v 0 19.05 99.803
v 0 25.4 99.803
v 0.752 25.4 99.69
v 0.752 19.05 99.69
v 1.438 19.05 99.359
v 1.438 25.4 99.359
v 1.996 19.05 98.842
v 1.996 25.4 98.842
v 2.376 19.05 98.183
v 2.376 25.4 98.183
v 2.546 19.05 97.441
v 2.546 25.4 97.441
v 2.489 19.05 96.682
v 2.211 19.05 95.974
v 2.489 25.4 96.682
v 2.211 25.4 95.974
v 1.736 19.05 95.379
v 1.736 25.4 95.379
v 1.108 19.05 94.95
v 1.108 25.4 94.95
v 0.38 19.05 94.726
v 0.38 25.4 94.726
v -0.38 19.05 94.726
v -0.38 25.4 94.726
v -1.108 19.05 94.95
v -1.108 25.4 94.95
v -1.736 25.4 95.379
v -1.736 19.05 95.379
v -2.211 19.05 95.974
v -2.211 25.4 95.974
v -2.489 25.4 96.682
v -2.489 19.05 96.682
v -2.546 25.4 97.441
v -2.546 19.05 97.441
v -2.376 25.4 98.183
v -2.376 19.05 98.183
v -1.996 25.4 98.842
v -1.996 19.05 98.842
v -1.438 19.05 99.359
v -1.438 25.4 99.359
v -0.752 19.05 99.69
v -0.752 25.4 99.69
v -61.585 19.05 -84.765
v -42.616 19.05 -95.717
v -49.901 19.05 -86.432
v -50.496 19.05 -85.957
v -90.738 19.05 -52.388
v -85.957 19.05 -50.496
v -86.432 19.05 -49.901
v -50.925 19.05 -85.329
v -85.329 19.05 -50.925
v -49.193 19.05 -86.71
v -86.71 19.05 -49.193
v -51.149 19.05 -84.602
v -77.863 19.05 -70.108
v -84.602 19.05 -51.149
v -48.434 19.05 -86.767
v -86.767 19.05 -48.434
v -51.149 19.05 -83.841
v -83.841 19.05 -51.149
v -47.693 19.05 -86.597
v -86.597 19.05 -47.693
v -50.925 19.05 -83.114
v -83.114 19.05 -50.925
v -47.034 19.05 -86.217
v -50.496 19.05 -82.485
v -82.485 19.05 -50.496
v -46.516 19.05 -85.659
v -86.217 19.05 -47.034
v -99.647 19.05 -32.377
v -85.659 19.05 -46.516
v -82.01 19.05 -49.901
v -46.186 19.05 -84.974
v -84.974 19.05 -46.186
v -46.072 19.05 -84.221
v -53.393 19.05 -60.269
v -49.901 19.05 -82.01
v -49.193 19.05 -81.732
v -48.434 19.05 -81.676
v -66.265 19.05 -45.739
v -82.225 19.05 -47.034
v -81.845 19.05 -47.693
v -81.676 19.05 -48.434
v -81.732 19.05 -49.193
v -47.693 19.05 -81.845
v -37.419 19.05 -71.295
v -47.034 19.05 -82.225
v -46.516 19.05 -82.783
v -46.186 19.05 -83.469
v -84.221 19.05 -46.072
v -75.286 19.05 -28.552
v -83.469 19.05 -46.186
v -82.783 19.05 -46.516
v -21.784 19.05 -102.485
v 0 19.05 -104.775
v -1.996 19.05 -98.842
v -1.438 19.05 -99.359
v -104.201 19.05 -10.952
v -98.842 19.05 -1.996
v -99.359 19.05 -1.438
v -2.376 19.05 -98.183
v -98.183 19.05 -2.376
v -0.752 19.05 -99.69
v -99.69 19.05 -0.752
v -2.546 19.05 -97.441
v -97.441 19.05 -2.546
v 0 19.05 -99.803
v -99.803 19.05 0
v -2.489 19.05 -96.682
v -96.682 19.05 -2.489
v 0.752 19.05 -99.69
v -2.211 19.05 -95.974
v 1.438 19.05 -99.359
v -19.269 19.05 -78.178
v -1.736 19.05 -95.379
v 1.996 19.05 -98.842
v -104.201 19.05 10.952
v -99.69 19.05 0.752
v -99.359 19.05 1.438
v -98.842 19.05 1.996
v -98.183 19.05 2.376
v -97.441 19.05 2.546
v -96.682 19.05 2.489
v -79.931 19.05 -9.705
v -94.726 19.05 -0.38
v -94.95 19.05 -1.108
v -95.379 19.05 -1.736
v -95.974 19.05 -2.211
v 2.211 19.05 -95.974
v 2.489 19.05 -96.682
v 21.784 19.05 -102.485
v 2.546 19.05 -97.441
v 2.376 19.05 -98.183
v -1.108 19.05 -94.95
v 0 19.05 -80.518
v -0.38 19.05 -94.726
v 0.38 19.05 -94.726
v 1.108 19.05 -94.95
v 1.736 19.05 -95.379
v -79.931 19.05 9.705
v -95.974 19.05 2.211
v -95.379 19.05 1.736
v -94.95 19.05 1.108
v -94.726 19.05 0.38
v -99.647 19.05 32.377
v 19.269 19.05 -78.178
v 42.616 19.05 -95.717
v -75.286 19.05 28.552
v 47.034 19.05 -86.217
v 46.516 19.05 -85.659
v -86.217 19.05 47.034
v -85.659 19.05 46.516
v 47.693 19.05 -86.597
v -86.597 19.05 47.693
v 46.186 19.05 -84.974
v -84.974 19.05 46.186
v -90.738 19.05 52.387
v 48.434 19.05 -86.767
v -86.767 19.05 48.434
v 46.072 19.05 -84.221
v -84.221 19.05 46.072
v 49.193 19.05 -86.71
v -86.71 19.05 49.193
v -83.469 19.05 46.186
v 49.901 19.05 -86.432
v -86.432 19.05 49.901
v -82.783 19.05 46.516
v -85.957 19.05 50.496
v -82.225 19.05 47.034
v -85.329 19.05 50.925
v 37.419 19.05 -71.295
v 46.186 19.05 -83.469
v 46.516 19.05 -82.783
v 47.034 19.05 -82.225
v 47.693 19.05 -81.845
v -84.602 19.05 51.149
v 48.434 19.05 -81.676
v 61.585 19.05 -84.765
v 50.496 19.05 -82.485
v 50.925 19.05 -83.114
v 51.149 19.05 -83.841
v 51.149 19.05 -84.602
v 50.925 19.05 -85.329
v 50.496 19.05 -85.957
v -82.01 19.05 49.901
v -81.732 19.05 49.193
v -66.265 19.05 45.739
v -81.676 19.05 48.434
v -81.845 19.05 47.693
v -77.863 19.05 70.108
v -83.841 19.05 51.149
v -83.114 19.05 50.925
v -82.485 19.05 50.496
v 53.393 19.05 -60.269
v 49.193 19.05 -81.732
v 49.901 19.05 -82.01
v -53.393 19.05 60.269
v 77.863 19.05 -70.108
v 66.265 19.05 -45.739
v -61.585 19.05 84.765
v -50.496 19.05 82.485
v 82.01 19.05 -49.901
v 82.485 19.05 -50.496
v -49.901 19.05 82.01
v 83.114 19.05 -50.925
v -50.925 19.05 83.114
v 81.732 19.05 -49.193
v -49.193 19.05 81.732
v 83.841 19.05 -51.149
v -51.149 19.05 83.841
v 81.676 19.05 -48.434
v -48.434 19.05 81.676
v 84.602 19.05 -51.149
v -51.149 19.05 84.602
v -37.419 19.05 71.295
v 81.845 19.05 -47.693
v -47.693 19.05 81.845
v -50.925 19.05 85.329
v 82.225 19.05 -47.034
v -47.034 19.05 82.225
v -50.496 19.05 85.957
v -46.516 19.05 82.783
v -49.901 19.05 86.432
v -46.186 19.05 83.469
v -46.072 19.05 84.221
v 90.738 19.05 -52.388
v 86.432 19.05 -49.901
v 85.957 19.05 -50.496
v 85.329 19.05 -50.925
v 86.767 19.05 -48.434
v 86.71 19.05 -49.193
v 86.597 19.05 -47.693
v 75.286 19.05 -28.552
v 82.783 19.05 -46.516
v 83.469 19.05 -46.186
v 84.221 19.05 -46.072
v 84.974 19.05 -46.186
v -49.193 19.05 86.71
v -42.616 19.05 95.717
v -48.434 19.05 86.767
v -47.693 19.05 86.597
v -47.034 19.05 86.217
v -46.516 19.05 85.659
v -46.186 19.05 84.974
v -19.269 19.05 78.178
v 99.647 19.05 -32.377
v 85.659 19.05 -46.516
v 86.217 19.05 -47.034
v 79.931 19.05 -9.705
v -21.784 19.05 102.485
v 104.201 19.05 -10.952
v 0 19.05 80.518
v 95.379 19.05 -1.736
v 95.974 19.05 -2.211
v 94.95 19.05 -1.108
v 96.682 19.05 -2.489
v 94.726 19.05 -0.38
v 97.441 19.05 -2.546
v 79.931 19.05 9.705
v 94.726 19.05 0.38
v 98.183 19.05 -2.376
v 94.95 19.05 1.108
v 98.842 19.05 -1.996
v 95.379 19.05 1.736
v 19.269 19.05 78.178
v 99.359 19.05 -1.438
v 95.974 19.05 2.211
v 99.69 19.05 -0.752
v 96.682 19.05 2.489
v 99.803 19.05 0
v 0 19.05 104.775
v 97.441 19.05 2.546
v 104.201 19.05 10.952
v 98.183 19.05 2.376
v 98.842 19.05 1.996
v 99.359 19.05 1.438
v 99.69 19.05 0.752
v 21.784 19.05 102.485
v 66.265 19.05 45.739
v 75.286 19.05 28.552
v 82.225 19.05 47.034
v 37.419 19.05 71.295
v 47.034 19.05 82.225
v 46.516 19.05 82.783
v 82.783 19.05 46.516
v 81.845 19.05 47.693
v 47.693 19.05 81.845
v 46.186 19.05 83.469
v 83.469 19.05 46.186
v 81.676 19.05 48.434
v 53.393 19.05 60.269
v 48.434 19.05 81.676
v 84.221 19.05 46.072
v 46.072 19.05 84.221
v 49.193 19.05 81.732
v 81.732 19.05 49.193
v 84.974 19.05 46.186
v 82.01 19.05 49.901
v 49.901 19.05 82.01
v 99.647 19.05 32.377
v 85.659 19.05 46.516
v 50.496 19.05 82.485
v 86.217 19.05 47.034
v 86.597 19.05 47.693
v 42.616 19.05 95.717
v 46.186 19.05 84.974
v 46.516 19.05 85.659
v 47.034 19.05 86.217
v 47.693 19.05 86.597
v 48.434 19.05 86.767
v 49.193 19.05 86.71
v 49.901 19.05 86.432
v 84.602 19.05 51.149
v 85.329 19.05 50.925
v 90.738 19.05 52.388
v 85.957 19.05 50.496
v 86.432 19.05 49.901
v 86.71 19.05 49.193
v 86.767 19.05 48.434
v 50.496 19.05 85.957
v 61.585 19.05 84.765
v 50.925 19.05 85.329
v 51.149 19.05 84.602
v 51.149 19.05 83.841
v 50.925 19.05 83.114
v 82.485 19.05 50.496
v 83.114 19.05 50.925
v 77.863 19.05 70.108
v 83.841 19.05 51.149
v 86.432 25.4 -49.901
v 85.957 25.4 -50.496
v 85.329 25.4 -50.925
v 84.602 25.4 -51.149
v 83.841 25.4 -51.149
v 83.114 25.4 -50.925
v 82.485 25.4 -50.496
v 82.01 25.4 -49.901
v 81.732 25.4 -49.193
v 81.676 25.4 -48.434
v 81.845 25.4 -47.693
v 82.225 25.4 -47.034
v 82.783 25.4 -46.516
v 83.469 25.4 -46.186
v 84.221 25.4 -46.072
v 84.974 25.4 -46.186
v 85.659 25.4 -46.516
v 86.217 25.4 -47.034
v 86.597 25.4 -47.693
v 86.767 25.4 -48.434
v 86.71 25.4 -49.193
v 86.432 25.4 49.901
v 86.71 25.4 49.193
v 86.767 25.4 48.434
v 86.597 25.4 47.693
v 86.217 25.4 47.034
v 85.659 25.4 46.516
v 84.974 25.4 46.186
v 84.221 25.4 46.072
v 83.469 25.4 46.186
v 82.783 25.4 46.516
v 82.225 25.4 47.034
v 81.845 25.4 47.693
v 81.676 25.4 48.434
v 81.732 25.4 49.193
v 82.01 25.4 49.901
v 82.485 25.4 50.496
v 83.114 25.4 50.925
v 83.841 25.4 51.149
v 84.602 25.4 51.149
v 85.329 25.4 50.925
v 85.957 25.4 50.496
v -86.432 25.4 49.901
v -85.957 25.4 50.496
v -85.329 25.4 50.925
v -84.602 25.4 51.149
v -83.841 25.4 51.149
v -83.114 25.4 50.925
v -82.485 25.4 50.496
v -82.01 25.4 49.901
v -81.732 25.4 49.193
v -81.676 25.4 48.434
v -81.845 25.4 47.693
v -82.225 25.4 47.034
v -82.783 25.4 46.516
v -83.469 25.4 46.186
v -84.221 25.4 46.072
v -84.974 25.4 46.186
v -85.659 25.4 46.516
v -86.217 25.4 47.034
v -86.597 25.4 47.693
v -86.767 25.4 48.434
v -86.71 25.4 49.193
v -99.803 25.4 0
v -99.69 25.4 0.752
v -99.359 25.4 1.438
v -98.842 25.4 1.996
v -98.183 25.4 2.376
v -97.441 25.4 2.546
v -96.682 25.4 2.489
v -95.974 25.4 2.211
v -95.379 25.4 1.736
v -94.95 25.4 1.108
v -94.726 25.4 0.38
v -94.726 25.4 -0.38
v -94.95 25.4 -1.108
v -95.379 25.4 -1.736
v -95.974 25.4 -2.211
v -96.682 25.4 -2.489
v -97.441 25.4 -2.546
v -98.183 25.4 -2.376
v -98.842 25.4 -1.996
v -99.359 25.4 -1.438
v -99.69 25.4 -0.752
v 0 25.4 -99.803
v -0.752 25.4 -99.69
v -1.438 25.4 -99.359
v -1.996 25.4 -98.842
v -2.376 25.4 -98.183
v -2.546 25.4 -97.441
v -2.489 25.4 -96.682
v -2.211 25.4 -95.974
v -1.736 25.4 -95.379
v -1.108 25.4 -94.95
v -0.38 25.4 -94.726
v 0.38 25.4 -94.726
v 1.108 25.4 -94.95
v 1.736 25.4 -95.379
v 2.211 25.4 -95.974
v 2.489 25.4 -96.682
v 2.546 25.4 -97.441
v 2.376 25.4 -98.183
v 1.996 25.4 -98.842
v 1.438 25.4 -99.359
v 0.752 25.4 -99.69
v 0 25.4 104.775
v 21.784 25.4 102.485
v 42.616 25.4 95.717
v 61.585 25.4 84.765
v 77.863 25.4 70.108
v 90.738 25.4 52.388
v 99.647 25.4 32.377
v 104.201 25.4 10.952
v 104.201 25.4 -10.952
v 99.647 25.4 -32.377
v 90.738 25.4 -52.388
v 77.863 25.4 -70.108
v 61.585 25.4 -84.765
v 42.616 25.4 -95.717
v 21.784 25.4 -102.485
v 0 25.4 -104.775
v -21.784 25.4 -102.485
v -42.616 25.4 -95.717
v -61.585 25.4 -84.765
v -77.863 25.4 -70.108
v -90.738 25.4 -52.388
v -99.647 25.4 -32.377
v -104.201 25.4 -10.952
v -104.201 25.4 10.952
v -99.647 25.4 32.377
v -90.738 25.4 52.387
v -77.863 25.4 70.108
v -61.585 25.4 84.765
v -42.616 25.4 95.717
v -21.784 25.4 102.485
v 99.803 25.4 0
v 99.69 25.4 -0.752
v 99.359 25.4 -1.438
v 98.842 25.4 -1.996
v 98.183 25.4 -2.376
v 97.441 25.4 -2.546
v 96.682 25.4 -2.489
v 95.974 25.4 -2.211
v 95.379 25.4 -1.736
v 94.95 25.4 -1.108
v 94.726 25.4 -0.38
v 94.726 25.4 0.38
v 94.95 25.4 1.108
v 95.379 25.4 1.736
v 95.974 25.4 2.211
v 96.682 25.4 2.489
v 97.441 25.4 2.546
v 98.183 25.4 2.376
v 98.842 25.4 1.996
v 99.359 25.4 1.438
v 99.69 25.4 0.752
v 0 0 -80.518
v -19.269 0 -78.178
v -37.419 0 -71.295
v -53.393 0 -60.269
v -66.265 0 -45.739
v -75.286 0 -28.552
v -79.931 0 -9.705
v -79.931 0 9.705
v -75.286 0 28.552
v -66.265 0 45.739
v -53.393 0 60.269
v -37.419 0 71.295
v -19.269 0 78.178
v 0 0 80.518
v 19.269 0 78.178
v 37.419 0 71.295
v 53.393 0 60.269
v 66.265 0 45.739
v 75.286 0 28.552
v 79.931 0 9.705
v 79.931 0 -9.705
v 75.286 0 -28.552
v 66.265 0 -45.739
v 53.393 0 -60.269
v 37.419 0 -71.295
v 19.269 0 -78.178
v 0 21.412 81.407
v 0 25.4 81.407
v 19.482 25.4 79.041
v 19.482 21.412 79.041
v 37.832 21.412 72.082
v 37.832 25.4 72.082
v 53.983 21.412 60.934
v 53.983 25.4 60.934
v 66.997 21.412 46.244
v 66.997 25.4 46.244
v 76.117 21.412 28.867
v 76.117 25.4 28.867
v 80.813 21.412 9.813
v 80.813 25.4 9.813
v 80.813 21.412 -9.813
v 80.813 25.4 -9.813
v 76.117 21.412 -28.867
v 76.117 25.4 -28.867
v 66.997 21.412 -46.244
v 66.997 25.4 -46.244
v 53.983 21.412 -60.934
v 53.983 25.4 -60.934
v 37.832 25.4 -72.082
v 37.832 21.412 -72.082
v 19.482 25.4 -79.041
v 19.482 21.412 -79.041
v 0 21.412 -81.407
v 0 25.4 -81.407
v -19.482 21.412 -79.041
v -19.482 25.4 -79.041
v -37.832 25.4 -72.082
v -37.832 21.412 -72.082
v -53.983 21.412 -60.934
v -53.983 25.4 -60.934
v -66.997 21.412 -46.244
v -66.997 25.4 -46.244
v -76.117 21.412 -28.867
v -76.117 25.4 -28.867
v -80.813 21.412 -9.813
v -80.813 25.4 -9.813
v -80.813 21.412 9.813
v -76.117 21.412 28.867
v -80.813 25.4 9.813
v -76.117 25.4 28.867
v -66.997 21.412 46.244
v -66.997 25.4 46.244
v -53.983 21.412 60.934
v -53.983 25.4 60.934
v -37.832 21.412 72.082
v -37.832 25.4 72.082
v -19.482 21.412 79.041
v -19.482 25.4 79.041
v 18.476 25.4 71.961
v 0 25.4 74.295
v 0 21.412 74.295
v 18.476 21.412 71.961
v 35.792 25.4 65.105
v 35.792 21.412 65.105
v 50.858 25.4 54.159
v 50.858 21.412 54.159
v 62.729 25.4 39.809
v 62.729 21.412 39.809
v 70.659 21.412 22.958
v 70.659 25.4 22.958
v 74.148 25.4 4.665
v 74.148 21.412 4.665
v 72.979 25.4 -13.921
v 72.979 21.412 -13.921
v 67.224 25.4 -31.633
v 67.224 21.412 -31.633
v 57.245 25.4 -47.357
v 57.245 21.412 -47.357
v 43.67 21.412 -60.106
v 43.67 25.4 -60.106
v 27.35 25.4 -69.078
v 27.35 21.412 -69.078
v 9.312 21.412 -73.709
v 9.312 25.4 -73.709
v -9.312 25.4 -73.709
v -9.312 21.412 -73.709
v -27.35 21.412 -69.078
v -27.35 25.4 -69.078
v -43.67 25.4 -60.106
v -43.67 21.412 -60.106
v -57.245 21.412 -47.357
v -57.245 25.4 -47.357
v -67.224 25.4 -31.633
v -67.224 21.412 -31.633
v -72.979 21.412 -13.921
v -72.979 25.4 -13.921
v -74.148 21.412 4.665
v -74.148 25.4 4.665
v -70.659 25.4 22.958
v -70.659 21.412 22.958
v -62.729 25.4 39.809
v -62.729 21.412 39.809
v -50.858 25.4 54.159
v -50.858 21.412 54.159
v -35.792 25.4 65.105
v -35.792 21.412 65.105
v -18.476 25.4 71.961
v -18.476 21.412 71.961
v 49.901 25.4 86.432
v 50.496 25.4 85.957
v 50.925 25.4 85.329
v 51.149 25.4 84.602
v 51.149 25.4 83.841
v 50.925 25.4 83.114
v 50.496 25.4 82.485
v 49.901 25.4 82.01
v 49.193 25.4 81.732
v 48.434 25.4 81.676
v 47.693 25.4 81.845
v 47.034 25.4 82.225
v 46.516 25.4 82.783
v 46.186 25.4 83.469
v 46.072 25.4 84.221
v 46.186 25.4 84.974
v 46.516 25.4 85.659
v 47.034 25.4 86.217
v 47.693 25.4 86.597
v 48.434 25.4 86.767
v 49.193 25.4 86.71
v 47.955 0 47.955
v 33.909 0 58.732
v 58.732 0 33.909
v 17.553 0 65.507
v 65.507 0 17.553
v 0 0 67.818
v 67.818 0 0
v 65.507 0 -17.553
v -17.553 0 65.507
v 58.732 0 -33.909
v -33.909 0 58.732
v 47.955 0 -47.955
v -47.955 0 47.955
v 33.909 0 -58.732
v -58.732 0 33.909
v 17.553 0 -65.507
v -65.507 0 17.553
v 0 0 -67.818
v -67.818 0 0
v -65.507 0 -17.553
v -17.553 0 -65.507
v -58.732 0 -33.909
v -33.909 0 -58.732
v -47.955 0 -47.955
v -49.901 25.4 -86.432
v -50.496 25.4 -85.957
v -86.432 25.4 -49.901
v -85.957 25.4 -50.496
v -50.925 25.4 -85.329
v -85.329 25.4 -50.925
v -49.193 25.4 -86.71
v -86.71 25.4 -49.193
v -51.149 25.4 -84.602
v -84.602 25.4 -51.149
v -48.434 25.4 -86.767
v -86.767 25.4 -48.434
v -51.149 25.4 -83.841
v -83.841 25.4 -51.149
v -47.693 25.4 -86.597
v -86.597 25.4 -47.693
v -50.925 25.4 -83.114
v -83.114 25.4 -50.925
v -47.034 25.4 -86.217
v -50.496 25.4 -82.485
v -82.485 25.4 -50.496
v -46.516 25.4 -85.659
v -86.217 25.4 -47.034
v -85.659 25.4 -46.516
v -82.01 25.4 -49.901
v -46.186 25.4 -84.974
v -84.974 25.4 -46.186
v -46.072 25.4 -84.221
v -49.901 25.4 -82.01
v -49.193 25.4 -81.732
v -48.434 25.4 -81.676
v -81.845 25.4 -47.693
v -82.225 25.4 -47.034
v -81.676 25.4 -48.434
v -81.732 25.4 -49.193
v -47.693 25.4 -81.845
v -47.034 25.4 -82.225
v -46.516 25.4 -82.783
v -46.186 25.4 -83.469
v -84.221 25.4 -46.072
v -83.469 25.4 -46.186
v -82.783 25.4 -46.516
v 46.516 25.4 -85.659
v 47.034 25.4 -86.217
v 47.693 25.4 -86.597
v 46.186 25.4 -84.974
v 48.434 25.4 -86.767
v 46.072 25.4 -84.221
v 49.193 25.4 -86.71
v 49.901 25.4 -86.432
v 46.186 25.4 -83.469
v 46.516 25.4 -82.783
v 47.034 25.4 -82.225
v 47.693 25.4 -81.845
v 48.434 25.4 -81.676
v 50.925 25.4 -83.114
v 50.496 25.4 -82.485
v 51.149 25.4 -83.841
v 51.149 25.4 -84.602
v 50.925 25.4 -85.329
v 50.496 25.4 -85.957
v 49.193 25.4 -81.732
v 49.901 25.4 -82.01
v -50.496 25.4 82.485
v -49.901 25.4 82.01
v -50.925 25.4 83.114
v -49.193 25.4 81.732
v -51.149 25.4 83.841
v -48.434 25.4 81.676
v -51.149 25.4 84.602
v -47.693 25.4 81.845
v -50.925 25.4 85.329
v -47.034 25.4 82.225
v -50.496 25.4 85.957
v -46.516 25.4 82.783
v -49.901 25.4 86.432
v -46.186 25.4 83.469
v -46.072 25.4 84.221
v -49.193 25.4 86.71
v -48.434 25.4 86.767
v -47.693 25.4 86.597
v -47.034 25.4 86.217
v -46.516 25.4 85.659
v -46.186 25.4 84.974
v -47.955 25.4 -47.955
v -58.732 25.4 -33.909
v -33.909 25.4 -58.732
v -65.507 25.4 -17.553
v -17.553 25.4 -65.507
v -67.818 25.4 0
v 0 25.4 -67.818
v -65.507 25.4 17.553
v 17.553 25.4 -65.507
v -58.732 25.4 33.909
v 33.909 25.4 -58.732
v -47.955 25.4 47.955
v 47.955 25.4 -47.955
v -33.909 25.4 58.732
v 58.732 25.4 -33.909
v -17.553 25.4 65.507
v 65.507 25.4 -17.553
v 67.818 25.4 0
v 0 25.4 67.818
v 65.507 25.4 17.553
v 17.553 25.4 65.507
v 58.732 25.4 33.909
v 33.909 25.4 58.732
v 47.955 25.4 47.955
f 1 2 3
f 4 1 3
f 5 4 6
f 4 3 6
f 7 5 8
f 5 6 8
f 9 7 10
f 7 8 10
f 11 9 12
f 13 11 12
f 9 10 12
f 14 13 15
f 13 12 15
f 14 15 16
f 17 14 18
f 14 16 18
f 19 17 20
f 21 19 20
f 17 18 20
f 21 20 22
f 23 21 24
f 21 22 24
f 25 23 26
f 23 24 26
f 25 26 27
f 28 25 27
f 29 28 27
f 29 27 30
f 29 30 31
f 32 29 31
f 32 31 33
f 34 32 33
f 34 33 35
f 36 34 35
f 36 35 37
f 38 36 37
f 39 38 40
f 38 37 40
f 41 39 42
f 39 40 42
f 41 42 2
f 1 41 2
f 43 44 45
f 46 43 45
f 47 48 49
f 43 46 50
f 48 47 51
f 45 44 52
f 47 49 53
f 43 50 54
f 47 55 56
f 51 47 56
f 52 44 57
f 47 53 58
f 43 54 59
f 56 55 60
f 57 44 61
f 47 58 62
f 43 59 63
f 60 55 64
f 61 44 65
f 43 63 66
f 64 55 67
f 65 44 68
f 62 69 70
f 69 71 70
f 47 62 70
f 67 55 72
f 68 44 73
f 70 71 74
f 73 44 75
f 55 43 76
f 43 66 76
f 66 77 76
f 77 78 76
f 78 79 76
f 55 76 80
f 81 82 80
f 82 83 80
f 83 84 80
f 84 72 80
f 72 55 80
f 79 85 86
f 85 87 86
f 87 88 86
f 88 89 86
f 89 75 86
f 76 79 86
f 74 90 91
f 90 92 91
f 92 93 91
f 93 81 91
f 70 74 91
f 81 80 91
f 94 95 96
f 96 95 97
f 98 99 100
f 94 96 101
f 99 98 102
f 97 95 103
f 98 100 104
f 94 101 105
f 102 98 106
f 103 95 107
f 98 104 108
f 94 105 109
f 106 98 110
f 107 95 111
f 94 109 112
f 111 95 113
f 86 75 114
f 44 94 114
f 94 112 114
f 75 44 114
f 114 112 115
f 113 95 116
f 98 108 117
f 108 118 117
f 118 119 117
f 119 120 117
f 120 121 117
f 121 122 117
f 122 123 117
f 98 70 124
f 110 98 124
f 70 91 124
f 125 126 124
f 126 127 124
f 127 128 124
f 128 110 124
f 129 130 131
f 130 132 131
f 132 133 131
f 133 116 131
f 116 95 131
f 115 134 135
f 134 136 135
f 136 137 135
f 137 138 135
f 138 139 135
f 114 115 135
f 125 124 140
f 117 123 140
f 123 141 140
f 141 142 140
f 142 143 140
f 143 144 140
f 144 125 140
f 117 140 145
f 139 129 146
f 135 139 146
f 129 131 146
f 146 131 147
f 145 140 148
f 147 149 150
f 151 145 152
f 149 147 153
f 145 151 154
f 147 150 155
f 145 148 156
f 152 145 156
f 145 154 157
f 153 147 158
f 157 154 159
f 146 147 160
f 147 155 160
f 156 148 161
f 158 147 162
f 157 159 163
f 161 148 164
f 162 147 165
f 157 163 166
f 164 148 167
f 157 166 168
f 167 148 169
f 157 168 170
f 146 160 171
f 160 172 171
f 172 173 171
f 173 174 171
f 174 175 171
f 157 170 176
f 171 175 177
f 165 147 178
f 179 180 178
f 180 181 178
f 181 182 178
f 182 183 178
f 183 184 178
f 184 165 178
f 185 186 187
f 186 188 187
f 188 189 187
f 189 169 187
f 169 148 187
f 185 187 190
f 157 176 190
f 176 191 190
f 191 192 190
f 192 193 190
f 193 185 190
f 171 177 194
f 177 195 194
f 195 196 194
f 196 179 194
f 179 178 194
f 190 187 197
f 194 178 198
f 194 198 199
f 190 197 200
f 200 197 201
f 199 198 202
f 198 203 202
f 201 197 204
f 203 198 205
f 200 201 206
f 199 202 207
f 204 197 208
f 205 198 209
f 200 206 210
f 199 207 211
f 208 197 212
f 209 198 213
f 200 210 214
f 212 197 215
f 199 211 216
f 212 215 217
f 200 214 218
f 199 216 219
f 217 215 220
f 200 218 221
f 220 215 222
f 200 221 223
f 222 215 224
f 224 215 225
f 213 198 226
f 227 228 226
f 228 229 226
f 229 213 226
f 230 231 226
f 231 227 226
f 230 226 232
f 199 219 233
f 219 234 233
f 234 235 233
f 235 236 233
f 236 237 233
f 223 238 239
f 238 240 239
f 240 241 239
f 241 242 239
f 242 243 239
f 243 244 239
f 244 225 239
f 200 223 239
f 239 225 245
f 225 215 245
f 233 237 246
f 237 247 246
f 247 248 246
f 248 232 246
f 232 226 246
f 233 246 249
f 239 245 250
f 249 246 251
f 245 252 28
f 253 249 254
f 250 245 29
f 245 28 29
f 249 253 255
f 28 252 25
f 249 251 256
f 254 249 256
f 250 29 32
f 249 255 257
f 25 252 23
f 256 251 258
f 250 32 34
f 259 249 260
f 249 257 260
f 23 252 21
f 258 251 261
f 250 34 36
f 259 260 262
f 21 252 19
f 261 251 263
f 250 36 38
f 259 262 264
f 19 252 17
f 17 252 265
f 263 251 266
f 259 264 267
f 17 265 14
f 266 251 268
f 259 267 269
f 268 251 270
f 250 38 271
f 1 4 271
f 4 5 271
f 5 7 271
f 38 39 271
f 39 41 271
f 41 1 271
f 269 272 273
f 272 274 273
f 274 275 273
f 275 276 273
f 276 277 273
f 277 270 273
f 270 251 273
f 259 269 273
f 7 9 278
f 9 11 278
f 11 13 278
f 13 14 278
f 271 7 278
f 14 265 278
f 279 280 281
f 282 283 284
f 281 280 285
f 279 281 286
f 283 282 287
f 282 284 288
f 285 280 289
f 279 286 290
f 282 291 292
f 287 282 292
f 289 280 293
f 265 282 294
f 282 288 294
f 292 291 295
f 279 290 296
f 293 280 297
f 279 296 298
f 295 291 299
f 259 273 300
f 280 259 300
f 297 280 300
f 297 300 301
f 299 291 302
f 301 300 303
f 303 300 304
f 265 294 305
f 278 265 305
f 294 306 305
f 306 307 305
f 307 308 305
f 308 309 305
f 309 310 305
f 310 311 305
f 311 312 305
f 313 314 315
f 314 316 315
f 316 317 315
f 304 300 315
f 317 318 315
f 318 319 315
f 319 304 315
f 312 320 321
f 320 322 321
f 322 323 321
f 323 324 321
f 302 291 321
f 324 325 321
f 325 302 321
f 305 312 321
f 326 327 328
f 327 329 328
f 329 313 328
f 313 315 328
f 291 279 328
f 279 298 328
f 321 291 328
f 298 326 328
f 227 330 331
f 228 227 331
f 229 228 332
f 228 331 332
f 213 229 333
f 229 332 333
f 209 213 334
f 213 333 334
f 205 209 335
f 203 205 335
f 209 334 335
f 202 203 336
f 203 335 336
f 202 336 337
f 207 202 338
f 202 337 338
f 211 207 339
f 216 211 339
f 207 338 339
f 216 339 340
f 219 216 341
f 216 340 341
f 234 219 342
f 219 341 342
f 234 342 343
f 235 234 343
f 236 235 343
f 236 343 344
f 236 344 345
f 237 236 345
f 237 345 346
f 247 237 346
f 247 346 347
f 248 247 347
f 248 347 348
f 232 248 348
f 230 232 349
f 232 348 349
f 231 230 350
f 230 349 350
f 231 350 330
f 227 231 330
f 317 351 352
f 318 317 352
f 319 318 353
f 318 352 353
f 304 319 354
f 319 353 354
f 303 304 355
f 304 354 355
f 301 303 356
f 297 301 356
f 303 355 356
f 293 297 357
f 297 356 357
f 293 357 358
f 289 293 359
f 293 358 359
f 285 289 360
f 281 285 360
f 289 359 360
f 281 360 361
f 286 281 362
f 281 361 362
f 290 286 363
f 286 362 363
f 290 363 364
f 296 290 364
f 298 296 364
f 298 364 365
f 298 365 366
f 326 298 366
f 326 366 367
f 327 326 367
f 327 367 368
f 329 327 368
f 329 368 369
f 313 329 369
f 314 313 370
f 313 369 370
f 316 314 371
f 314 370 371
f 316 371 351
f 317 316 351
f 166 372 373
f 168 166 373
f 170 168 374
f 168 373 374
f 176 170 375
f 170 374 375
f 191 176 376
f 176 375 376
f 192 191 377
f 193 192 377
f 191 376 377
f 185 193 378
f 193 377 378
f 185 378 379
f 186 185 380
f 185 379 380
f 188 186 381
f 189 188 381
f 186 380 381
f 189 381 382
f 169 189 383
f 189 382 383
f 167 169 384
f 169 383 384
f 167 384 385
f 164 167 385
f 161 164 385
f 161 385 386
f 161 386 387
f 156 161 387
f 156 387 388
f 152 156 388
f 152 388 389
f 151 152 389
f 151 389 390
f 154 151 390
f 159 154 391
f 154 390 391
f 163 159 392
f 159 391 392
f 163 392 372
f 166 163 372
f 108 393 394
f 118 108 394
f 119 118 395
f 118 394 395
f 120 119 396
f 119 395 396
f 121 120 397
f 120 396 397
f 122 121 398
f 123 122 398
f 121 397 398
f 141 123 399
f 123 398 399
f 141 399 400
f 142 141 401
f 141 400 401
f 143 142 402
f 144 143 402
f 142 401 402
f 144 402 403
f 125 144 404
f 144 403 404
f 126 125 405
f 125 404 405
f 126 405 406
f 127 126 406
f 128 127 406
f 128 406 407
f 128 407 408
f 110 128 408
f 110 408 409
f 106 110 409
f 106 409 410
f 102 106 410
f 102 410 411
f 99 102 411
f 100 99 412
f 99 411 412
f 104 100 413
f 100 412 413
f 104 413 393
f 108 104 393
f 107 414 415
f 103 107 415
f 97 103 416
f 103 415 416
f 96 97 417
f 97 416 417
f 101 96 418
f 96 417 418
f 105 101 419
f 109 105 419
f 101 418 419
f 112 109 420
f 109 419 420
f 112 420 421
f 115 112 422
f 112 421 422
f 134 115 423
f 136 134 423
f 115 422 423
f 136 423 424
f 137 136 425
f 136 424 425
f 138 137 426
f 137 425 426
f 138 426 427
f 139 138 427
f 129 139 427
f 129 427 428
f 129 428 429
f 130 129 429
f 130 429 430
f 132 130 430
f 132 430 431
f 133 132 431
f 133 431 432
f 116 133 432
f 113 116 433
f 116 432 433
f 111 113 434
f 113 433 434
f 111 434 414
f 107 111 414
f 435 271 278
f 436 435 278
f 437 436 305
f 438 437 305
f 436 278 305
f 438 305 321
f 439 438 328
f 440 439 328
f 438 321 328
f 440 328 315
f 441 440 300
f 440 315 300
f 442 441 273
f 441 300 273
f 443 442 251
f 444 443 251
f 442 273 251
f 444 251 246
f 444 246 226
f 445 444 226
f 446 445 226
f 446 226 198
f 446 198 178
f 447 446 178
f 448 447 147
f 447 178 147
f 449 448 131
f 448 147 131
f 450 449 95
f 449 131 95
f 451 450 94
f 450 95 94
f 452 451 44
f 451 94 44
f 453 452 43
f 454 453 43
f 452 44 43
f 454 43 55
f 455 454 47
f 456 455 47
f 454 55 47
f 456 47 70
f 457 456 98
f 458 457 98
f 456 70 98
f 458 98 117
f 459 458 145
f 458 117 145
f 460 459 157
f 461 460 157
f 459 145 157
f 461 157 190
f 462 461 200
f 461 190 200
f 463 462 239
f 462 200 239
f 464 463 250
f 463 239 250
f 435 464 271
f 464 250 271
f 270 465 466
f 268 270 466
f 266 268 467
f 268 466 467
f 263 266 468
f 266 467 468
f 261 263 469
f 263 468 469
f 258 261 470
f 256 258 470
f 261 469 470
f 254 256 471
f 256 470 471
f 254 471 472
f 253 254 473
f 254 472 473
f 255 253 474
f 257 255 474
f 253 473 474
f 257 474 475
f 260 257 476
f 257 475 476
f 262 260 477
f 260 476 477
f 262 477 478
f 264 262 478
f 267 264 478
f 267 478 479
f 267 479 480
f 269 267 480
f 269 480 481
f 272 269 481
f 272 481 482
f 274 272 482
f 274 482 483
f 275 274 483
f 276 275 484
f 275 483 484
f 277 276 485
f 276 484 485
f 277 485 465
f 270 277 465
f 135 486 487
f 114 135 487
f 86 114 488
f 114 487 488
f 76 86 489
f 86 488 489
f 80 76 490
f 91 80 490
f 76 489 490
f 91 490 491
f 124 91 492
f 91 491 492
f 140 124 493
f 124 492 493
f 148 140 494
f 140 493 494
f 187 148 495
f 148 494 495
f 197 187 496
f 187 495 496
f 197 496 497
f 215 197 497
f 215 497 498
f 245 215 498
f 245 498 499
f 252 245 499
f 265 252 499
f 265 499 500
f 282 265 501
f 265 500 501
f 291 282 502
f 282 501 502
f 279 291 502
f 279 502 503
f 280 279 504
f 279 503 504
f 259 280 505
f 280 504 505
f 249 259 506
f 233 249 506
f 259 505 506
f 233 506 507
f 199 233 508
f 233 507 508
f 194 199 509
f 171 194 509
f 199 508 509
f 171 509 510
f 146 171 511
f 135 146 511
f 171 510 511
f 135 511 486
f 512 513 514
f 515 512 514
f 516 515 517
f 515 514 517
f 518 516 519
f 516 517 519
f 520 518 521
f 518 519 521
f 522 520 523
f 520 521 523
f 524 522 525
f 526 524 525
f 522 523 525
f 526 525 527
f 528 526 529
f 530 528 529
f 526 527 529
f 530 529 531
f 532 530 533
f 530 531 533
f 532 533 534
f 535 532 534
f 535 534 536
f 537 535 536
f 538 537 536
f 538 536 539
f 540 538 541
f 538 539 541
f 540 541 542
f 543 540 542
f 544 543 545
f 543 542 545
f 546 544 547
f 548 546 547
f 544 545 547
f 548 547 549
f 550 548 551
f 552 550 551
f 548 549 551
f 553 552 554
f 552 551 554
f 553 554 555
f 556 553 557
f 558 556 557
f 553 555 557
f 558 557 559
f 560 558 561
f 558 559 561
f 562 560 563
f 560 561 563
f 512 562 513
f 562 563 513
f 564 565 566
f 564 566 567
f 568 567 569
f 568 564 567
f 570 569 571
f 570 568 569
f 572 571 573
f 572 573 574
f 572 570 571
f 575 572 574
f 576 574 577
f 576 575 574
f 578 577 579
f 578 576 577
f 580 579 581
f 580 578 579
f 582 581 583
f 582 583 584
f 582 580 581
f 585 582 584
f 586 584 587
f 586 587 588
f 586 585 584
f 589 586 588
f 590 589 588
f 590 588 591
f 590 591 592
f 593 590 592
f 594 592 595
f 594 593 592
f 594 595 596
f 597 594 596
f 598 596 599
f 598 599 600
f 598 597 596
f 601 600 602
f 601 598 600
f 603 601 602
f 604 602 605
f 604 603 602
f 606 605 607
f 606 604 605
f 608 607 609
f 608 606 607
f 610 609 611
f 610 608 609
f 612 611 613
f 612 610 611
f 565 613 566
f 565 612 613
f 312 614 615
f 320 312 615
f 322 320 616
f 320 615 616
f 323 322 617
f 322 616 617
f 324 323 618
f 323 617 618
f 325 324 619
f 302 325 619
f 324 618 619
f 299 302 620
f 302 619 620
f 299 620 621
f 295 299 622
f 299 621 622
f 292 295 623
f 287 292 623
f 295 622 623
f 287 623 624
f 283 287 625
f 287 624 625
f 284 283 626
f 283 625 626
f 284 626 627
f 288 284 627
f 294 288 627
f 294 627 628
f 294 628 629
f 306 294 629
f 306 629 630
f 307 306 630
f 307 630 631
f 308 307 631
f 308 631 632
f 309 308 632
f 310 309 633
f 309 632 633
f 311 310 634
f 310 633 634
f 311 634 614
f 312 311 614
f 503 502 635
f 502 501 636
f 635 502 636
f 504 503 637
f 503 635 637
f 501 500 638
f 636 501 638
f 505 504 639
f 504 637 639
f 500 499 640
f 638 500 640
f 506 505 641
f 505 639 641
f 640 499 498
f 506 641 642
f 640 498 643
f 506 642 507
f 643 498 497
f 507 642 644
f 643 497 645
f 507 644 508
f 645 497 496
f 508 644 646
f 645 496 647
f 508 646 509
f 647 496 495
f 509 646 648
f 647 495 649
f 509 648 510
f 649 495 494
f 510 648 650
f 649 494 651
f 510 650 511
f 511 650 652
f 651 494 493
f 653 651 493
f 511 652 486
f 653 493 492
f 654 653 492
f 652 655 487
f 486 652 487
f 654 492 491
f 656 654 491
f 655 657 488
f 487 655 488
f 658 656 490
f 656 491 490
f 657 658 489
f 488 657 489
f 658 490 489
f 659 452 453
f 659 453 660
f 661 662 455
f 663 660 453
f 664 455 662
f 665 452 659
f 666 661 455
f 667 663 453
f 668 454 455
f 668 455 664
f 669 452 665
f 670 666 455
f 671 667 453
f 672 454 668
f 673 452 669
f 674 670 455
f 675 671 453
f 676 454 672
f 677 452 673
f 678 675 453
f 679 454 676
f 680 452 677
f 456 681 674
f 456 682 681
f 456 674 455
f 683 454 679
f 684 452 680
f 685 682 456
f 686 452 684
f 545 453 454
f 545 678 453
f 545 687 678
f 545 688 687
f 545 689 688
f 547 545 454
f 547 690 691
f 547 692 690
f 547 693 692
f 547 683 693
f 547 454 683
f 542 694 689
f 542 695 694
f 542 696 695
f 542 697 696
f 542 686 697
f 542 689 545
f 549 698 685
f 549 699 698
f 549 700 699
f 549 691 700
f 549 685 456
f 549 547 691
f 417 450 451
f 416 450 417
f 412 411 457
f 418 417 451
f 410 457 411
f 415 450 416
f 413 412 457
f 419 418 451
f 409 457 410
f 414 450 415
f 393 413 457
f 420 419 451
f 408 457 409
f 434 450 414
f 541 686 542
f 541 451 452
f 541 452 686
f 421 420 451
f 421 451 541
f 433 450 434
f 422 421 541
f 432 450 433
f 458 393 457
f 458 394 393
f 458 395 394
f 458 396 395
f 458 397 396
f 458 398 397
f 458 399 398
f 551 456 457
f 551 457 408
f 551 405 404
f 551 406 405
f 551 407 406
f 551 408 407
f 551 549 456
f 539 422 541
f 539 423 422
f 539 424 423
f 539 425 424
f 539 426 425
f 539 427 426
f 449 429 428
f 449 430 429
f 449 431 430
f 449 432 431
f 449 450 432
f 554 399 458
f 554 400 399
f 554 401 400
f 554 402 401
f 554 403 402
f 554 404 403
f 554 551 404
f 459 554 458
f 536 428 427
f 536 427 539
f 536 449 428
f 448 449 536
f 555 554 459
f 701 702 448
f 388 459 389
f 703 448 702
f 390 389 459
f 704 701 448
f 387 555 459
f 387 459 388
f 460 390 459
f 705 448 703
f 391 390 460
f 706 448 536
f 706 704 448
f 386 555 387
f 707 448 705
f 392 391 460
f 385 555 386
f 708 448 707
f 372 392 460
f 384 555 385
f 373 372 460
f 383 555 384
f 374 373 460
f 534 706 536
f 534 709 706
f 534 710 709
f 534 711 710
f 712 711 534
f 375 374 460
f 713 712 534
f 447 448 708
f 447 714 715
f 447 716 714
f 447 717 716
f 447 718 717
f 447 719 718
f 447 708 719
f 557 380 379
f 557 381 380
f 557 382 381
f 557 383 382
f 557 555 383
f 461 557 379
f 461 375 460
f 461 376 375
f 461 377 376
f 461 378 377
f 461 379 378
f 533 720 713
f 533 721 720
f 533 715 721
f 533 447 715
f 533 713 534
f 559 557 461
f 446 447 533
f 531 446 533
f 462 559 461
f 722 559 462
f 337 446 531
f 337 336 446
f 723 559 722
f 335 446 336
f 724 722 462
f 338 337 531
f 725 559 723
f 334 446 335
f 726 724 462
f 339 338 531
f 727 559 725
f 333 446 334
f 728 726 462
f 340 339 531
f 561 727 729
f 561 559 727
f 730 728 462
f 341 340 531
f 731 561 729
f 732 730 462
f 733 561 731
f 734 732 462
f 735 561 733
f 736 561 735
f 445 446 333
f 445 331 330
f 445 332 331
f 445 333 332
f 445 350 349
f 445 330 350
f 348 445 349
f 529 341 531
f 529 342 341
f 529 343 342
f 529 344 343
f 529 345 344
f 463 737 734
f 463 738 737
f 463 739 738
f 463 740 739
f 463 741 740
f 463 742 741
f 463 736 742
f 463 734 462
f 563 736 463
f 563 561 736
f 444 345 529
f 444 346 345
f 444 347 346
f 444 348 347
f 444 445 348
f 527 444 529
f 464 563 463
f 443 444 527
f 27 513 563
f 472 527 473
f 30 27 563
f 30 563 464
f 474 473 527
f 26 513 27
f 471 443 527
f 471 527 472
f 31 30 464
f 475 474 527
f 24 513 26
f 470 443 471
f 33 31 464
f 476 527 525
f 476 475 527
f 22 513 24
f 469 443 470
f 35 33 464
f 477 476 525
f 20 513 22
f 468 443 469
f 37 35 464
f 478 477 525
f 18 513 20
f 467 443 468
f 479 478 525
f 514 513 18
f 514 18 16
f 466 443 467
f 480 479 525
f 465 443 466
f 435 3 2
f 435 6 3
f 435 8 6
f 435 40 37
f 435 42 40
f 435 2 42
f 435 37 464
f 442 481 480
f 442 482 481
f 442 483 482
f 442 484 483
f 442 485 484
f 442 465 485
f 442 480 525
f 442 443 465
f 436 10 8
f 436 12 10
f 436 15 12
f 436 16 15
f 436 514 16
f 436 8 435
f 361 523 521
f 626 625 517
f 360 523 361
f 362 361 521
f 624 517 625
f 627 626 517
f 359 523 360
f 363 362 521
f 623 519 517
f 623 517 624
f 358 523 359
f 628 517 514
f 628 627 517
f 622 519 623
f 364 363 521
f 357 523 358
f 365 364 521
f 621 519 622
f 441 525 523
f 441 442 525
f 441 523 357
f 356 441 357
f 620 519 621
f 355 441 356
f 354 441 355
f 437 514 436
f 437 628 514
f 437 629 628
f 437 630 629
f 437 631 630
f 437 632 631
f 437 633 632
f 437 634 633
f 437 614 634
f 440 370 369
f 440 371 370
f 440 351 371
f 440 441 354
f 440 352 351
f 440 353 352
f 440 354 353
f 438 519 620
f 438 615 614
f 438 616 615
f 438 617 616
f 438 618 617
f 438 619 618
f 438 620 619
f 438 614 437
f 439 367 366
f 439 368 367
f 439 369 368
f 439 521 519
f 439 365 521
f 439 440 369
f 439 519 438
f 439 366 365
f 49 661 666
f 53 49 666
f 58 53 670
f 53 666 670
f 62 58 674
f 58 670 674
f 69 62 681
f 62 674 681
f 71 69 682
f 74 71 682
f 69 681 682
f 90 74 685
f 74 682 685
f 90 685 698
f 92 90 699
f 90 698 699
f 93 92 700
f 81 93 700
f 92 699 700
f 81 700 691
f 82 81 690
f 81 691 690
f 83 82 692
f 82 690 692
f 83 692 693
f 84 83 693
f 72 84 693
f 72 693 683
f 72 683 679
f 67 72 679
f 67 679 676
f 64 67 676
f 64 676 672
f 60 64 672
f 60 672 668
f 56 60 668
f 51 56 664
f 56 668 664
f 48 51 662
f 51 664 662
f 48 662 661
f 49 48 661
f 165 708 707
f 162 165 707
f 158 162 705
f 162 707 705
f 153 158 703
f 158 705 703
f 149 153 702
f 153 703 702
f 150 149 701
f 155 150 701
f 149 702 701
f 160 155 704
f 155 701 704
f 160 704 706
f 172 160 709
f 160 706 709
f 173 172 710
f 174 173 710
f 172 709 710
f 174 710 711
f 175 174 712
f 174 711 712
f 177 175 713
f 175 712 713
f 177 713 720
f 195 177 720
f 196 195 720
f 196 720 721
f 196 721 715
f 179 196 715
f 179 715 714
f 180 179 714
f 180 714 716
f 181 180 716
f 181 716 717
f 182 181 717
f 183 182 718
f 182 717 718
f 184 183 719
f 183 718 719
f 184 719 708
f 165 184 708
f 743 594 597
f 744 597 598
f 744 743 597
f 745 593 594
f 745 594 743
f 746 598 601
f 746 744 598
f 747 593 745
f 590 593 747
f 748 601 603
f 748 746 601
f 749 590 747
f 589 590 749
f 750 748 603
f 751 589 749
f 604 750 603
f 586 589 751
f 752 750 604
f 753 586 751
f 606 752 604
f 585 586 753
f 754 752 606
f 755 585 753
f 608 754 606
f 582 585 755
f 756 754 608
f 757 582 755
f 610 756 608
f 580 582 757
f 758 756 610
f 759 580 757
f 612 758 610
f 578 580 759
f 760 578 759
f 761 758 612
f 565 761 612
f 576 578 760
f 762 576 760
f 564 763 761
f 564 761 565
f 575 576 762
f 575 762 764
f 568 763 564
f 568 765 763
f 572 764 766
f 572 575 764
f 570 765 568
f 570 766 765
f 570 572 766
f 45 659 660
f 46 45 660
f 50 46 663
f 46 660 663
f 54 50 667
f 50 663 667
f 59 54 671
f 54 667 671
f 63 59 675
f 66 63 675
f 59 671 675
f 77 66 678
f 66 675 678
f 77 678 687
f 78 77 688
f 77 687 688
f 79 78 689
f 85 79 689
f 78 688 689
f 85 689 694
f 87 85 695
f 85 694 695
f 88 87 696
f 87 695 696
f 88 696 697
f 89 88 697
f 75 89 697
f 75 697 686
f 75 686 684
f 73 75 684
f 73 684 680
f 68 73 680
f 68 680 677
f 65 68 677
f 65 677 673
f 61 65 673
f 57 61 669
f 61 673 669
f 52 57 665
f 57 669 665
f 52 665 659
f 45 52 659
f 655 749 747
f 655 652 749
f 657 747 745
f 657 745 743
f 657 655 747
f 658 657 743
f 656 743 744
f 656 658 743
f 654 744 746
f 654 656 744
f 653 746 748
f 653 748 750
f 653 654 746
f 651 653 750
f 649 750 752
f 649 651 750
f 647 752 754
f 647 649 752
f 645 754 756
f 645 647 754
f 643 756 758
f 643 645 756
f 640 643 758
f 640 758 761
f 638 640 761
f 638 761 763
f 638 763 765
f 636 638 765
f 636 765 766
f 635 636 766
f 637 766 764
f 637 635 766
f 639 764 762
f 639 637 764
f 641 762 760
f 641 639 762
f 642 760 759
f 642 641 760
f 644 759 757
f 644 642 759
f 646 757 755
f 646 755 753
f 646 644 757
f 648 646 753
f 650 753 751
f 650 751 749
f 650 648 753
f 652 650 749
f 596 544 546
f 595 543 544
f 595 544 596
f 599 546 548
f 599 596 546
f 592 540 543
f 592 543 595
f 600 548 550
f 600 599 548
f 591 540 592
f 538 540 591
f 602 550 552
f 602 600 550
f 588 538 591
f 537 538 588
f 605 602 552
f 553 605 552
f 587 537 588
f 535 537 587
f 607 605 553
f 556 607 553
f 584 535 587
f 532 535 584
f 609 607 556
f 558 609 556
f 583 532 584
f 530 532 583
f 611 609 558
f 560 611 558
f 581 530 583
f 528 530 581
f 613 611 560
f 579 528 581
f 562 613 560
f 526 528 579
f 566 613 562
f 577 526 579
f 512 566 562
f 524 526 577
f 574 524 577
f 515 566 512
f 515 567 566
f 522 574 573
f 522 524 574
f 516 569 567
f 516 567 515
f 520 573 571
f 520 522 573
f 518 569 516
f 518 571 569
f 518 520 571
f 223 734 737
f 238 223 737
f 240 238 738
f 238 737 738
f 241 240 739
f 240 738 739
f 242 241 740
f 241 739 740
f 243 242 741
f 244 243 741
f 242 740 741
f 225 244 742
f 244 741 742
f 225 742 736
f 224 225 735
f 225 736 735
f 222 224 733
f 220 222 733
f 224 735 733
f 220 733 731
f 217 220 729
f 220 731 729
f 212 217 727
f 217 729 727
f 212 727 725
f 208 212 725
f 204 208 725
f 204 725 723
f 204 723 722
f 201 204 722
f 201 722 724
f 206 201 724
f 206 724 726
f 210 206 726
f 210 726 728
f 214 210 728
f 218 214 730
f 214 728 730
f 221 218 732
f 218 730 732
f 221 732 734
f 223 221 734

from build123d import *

# Parameters (mm, degrees)
SKETCH1_R            = 80.518
SKETCH1_R_2          = 67.818
INNER_CYLINDER_DEPTH = 19.05
SKETCH2_R            = 104.775
SKETCH2_R_2          = 67.818
FLANGE_DEPTH         = 6.35
SKETCH4_R            = 81.407
SKETCH4_R_2          = 74.295
GROOVE_DEPTH         = 3.9878
SKETCH5_R            = 2.5527
SCREW_HOLES_DEPTH    = 6.35
CIRPATTERN1_COUNT    = 12


with BuildPart() as part:
    # Sketch1 → Inner Cylinder (new body)
    with BuildSketch(Plane(origin=(0, 0, 0), x_dir=(1, 0, 0), z_dir=(0, 1, 0))):
        with Locations(Location((0, 0, 0), (0, 0, 90))):
            Circle(SKETCH1_R)
        with Locations(Location((0, 0, 0), (0, 0, 90))):
            Circle(SKETCH1_R_2, mode=Mode.SUBTRACT)
    extrude(amount=INNER_CYLINDER_DEPTH)

    # Sketch2 → Flange (add)
    with BuildSketch(Plane(origin=(0, 19.05, 0), x_dir=(1, 0, 0), z_dir=(0, 1, 0))):
        with Locations(Location((0, 0, 0), (0, 0, 270))):
            Circle(SKETCH2_R)
        with Locations(Location((0, 0, 0), (0, 0, 90))):
            Circle(SKETCH2_R_2, mode=Mode.SUBTRACT)
    extrude(amount=FLANGE_DEPTH)

    # Sketch4 → Groove (cut)
    with BuildSketch(Plane(origin=(0, 25.4, 0), x_dir=(1, 0, 0), z_dir=(0, 1, 0))):
        with Locations(Location((0, 0, 0), (0, 0, 270))):
            Circle(SKETCH4_R)
        with Locations(Location((0, 0, 0), (0, 0, 270))):
            Circle(SKETCH4_R_2, mode=Mode.SUBTRACT)
    extrude(amount=-GROOVE_DEPTH, mode=Mode.SUBTRACT)

    # Sketch5 → Screw Holes (cut)
    with BuildSketch(Plane(origin=(0, 25.4, 0), x_dir=(1, 0, 0), z_dir=(0, 1, 0))):
        with Locations(Location((0, -97.25025, 0), (0, 0, 270))):
            Circle(SKETCH5_R)
    screw_holes = extrude(amount=-SCREW_HOLES_DEPTH, mode=Mode.SUBTRACT)

    # CirPattern1: Screw Holes ×12 about axis
    cirpattern1_axis = Axis((0, 0, 0), (0, 1, 0))
    for i in range(1, CIRPATTERN1_COUNT):
        add(screw_holes.rotate(cirpattern1_axis, i * 360 / CIRPATTERN1_COUNT), mode=Mode.SUBTRACT)


solid = part.part
